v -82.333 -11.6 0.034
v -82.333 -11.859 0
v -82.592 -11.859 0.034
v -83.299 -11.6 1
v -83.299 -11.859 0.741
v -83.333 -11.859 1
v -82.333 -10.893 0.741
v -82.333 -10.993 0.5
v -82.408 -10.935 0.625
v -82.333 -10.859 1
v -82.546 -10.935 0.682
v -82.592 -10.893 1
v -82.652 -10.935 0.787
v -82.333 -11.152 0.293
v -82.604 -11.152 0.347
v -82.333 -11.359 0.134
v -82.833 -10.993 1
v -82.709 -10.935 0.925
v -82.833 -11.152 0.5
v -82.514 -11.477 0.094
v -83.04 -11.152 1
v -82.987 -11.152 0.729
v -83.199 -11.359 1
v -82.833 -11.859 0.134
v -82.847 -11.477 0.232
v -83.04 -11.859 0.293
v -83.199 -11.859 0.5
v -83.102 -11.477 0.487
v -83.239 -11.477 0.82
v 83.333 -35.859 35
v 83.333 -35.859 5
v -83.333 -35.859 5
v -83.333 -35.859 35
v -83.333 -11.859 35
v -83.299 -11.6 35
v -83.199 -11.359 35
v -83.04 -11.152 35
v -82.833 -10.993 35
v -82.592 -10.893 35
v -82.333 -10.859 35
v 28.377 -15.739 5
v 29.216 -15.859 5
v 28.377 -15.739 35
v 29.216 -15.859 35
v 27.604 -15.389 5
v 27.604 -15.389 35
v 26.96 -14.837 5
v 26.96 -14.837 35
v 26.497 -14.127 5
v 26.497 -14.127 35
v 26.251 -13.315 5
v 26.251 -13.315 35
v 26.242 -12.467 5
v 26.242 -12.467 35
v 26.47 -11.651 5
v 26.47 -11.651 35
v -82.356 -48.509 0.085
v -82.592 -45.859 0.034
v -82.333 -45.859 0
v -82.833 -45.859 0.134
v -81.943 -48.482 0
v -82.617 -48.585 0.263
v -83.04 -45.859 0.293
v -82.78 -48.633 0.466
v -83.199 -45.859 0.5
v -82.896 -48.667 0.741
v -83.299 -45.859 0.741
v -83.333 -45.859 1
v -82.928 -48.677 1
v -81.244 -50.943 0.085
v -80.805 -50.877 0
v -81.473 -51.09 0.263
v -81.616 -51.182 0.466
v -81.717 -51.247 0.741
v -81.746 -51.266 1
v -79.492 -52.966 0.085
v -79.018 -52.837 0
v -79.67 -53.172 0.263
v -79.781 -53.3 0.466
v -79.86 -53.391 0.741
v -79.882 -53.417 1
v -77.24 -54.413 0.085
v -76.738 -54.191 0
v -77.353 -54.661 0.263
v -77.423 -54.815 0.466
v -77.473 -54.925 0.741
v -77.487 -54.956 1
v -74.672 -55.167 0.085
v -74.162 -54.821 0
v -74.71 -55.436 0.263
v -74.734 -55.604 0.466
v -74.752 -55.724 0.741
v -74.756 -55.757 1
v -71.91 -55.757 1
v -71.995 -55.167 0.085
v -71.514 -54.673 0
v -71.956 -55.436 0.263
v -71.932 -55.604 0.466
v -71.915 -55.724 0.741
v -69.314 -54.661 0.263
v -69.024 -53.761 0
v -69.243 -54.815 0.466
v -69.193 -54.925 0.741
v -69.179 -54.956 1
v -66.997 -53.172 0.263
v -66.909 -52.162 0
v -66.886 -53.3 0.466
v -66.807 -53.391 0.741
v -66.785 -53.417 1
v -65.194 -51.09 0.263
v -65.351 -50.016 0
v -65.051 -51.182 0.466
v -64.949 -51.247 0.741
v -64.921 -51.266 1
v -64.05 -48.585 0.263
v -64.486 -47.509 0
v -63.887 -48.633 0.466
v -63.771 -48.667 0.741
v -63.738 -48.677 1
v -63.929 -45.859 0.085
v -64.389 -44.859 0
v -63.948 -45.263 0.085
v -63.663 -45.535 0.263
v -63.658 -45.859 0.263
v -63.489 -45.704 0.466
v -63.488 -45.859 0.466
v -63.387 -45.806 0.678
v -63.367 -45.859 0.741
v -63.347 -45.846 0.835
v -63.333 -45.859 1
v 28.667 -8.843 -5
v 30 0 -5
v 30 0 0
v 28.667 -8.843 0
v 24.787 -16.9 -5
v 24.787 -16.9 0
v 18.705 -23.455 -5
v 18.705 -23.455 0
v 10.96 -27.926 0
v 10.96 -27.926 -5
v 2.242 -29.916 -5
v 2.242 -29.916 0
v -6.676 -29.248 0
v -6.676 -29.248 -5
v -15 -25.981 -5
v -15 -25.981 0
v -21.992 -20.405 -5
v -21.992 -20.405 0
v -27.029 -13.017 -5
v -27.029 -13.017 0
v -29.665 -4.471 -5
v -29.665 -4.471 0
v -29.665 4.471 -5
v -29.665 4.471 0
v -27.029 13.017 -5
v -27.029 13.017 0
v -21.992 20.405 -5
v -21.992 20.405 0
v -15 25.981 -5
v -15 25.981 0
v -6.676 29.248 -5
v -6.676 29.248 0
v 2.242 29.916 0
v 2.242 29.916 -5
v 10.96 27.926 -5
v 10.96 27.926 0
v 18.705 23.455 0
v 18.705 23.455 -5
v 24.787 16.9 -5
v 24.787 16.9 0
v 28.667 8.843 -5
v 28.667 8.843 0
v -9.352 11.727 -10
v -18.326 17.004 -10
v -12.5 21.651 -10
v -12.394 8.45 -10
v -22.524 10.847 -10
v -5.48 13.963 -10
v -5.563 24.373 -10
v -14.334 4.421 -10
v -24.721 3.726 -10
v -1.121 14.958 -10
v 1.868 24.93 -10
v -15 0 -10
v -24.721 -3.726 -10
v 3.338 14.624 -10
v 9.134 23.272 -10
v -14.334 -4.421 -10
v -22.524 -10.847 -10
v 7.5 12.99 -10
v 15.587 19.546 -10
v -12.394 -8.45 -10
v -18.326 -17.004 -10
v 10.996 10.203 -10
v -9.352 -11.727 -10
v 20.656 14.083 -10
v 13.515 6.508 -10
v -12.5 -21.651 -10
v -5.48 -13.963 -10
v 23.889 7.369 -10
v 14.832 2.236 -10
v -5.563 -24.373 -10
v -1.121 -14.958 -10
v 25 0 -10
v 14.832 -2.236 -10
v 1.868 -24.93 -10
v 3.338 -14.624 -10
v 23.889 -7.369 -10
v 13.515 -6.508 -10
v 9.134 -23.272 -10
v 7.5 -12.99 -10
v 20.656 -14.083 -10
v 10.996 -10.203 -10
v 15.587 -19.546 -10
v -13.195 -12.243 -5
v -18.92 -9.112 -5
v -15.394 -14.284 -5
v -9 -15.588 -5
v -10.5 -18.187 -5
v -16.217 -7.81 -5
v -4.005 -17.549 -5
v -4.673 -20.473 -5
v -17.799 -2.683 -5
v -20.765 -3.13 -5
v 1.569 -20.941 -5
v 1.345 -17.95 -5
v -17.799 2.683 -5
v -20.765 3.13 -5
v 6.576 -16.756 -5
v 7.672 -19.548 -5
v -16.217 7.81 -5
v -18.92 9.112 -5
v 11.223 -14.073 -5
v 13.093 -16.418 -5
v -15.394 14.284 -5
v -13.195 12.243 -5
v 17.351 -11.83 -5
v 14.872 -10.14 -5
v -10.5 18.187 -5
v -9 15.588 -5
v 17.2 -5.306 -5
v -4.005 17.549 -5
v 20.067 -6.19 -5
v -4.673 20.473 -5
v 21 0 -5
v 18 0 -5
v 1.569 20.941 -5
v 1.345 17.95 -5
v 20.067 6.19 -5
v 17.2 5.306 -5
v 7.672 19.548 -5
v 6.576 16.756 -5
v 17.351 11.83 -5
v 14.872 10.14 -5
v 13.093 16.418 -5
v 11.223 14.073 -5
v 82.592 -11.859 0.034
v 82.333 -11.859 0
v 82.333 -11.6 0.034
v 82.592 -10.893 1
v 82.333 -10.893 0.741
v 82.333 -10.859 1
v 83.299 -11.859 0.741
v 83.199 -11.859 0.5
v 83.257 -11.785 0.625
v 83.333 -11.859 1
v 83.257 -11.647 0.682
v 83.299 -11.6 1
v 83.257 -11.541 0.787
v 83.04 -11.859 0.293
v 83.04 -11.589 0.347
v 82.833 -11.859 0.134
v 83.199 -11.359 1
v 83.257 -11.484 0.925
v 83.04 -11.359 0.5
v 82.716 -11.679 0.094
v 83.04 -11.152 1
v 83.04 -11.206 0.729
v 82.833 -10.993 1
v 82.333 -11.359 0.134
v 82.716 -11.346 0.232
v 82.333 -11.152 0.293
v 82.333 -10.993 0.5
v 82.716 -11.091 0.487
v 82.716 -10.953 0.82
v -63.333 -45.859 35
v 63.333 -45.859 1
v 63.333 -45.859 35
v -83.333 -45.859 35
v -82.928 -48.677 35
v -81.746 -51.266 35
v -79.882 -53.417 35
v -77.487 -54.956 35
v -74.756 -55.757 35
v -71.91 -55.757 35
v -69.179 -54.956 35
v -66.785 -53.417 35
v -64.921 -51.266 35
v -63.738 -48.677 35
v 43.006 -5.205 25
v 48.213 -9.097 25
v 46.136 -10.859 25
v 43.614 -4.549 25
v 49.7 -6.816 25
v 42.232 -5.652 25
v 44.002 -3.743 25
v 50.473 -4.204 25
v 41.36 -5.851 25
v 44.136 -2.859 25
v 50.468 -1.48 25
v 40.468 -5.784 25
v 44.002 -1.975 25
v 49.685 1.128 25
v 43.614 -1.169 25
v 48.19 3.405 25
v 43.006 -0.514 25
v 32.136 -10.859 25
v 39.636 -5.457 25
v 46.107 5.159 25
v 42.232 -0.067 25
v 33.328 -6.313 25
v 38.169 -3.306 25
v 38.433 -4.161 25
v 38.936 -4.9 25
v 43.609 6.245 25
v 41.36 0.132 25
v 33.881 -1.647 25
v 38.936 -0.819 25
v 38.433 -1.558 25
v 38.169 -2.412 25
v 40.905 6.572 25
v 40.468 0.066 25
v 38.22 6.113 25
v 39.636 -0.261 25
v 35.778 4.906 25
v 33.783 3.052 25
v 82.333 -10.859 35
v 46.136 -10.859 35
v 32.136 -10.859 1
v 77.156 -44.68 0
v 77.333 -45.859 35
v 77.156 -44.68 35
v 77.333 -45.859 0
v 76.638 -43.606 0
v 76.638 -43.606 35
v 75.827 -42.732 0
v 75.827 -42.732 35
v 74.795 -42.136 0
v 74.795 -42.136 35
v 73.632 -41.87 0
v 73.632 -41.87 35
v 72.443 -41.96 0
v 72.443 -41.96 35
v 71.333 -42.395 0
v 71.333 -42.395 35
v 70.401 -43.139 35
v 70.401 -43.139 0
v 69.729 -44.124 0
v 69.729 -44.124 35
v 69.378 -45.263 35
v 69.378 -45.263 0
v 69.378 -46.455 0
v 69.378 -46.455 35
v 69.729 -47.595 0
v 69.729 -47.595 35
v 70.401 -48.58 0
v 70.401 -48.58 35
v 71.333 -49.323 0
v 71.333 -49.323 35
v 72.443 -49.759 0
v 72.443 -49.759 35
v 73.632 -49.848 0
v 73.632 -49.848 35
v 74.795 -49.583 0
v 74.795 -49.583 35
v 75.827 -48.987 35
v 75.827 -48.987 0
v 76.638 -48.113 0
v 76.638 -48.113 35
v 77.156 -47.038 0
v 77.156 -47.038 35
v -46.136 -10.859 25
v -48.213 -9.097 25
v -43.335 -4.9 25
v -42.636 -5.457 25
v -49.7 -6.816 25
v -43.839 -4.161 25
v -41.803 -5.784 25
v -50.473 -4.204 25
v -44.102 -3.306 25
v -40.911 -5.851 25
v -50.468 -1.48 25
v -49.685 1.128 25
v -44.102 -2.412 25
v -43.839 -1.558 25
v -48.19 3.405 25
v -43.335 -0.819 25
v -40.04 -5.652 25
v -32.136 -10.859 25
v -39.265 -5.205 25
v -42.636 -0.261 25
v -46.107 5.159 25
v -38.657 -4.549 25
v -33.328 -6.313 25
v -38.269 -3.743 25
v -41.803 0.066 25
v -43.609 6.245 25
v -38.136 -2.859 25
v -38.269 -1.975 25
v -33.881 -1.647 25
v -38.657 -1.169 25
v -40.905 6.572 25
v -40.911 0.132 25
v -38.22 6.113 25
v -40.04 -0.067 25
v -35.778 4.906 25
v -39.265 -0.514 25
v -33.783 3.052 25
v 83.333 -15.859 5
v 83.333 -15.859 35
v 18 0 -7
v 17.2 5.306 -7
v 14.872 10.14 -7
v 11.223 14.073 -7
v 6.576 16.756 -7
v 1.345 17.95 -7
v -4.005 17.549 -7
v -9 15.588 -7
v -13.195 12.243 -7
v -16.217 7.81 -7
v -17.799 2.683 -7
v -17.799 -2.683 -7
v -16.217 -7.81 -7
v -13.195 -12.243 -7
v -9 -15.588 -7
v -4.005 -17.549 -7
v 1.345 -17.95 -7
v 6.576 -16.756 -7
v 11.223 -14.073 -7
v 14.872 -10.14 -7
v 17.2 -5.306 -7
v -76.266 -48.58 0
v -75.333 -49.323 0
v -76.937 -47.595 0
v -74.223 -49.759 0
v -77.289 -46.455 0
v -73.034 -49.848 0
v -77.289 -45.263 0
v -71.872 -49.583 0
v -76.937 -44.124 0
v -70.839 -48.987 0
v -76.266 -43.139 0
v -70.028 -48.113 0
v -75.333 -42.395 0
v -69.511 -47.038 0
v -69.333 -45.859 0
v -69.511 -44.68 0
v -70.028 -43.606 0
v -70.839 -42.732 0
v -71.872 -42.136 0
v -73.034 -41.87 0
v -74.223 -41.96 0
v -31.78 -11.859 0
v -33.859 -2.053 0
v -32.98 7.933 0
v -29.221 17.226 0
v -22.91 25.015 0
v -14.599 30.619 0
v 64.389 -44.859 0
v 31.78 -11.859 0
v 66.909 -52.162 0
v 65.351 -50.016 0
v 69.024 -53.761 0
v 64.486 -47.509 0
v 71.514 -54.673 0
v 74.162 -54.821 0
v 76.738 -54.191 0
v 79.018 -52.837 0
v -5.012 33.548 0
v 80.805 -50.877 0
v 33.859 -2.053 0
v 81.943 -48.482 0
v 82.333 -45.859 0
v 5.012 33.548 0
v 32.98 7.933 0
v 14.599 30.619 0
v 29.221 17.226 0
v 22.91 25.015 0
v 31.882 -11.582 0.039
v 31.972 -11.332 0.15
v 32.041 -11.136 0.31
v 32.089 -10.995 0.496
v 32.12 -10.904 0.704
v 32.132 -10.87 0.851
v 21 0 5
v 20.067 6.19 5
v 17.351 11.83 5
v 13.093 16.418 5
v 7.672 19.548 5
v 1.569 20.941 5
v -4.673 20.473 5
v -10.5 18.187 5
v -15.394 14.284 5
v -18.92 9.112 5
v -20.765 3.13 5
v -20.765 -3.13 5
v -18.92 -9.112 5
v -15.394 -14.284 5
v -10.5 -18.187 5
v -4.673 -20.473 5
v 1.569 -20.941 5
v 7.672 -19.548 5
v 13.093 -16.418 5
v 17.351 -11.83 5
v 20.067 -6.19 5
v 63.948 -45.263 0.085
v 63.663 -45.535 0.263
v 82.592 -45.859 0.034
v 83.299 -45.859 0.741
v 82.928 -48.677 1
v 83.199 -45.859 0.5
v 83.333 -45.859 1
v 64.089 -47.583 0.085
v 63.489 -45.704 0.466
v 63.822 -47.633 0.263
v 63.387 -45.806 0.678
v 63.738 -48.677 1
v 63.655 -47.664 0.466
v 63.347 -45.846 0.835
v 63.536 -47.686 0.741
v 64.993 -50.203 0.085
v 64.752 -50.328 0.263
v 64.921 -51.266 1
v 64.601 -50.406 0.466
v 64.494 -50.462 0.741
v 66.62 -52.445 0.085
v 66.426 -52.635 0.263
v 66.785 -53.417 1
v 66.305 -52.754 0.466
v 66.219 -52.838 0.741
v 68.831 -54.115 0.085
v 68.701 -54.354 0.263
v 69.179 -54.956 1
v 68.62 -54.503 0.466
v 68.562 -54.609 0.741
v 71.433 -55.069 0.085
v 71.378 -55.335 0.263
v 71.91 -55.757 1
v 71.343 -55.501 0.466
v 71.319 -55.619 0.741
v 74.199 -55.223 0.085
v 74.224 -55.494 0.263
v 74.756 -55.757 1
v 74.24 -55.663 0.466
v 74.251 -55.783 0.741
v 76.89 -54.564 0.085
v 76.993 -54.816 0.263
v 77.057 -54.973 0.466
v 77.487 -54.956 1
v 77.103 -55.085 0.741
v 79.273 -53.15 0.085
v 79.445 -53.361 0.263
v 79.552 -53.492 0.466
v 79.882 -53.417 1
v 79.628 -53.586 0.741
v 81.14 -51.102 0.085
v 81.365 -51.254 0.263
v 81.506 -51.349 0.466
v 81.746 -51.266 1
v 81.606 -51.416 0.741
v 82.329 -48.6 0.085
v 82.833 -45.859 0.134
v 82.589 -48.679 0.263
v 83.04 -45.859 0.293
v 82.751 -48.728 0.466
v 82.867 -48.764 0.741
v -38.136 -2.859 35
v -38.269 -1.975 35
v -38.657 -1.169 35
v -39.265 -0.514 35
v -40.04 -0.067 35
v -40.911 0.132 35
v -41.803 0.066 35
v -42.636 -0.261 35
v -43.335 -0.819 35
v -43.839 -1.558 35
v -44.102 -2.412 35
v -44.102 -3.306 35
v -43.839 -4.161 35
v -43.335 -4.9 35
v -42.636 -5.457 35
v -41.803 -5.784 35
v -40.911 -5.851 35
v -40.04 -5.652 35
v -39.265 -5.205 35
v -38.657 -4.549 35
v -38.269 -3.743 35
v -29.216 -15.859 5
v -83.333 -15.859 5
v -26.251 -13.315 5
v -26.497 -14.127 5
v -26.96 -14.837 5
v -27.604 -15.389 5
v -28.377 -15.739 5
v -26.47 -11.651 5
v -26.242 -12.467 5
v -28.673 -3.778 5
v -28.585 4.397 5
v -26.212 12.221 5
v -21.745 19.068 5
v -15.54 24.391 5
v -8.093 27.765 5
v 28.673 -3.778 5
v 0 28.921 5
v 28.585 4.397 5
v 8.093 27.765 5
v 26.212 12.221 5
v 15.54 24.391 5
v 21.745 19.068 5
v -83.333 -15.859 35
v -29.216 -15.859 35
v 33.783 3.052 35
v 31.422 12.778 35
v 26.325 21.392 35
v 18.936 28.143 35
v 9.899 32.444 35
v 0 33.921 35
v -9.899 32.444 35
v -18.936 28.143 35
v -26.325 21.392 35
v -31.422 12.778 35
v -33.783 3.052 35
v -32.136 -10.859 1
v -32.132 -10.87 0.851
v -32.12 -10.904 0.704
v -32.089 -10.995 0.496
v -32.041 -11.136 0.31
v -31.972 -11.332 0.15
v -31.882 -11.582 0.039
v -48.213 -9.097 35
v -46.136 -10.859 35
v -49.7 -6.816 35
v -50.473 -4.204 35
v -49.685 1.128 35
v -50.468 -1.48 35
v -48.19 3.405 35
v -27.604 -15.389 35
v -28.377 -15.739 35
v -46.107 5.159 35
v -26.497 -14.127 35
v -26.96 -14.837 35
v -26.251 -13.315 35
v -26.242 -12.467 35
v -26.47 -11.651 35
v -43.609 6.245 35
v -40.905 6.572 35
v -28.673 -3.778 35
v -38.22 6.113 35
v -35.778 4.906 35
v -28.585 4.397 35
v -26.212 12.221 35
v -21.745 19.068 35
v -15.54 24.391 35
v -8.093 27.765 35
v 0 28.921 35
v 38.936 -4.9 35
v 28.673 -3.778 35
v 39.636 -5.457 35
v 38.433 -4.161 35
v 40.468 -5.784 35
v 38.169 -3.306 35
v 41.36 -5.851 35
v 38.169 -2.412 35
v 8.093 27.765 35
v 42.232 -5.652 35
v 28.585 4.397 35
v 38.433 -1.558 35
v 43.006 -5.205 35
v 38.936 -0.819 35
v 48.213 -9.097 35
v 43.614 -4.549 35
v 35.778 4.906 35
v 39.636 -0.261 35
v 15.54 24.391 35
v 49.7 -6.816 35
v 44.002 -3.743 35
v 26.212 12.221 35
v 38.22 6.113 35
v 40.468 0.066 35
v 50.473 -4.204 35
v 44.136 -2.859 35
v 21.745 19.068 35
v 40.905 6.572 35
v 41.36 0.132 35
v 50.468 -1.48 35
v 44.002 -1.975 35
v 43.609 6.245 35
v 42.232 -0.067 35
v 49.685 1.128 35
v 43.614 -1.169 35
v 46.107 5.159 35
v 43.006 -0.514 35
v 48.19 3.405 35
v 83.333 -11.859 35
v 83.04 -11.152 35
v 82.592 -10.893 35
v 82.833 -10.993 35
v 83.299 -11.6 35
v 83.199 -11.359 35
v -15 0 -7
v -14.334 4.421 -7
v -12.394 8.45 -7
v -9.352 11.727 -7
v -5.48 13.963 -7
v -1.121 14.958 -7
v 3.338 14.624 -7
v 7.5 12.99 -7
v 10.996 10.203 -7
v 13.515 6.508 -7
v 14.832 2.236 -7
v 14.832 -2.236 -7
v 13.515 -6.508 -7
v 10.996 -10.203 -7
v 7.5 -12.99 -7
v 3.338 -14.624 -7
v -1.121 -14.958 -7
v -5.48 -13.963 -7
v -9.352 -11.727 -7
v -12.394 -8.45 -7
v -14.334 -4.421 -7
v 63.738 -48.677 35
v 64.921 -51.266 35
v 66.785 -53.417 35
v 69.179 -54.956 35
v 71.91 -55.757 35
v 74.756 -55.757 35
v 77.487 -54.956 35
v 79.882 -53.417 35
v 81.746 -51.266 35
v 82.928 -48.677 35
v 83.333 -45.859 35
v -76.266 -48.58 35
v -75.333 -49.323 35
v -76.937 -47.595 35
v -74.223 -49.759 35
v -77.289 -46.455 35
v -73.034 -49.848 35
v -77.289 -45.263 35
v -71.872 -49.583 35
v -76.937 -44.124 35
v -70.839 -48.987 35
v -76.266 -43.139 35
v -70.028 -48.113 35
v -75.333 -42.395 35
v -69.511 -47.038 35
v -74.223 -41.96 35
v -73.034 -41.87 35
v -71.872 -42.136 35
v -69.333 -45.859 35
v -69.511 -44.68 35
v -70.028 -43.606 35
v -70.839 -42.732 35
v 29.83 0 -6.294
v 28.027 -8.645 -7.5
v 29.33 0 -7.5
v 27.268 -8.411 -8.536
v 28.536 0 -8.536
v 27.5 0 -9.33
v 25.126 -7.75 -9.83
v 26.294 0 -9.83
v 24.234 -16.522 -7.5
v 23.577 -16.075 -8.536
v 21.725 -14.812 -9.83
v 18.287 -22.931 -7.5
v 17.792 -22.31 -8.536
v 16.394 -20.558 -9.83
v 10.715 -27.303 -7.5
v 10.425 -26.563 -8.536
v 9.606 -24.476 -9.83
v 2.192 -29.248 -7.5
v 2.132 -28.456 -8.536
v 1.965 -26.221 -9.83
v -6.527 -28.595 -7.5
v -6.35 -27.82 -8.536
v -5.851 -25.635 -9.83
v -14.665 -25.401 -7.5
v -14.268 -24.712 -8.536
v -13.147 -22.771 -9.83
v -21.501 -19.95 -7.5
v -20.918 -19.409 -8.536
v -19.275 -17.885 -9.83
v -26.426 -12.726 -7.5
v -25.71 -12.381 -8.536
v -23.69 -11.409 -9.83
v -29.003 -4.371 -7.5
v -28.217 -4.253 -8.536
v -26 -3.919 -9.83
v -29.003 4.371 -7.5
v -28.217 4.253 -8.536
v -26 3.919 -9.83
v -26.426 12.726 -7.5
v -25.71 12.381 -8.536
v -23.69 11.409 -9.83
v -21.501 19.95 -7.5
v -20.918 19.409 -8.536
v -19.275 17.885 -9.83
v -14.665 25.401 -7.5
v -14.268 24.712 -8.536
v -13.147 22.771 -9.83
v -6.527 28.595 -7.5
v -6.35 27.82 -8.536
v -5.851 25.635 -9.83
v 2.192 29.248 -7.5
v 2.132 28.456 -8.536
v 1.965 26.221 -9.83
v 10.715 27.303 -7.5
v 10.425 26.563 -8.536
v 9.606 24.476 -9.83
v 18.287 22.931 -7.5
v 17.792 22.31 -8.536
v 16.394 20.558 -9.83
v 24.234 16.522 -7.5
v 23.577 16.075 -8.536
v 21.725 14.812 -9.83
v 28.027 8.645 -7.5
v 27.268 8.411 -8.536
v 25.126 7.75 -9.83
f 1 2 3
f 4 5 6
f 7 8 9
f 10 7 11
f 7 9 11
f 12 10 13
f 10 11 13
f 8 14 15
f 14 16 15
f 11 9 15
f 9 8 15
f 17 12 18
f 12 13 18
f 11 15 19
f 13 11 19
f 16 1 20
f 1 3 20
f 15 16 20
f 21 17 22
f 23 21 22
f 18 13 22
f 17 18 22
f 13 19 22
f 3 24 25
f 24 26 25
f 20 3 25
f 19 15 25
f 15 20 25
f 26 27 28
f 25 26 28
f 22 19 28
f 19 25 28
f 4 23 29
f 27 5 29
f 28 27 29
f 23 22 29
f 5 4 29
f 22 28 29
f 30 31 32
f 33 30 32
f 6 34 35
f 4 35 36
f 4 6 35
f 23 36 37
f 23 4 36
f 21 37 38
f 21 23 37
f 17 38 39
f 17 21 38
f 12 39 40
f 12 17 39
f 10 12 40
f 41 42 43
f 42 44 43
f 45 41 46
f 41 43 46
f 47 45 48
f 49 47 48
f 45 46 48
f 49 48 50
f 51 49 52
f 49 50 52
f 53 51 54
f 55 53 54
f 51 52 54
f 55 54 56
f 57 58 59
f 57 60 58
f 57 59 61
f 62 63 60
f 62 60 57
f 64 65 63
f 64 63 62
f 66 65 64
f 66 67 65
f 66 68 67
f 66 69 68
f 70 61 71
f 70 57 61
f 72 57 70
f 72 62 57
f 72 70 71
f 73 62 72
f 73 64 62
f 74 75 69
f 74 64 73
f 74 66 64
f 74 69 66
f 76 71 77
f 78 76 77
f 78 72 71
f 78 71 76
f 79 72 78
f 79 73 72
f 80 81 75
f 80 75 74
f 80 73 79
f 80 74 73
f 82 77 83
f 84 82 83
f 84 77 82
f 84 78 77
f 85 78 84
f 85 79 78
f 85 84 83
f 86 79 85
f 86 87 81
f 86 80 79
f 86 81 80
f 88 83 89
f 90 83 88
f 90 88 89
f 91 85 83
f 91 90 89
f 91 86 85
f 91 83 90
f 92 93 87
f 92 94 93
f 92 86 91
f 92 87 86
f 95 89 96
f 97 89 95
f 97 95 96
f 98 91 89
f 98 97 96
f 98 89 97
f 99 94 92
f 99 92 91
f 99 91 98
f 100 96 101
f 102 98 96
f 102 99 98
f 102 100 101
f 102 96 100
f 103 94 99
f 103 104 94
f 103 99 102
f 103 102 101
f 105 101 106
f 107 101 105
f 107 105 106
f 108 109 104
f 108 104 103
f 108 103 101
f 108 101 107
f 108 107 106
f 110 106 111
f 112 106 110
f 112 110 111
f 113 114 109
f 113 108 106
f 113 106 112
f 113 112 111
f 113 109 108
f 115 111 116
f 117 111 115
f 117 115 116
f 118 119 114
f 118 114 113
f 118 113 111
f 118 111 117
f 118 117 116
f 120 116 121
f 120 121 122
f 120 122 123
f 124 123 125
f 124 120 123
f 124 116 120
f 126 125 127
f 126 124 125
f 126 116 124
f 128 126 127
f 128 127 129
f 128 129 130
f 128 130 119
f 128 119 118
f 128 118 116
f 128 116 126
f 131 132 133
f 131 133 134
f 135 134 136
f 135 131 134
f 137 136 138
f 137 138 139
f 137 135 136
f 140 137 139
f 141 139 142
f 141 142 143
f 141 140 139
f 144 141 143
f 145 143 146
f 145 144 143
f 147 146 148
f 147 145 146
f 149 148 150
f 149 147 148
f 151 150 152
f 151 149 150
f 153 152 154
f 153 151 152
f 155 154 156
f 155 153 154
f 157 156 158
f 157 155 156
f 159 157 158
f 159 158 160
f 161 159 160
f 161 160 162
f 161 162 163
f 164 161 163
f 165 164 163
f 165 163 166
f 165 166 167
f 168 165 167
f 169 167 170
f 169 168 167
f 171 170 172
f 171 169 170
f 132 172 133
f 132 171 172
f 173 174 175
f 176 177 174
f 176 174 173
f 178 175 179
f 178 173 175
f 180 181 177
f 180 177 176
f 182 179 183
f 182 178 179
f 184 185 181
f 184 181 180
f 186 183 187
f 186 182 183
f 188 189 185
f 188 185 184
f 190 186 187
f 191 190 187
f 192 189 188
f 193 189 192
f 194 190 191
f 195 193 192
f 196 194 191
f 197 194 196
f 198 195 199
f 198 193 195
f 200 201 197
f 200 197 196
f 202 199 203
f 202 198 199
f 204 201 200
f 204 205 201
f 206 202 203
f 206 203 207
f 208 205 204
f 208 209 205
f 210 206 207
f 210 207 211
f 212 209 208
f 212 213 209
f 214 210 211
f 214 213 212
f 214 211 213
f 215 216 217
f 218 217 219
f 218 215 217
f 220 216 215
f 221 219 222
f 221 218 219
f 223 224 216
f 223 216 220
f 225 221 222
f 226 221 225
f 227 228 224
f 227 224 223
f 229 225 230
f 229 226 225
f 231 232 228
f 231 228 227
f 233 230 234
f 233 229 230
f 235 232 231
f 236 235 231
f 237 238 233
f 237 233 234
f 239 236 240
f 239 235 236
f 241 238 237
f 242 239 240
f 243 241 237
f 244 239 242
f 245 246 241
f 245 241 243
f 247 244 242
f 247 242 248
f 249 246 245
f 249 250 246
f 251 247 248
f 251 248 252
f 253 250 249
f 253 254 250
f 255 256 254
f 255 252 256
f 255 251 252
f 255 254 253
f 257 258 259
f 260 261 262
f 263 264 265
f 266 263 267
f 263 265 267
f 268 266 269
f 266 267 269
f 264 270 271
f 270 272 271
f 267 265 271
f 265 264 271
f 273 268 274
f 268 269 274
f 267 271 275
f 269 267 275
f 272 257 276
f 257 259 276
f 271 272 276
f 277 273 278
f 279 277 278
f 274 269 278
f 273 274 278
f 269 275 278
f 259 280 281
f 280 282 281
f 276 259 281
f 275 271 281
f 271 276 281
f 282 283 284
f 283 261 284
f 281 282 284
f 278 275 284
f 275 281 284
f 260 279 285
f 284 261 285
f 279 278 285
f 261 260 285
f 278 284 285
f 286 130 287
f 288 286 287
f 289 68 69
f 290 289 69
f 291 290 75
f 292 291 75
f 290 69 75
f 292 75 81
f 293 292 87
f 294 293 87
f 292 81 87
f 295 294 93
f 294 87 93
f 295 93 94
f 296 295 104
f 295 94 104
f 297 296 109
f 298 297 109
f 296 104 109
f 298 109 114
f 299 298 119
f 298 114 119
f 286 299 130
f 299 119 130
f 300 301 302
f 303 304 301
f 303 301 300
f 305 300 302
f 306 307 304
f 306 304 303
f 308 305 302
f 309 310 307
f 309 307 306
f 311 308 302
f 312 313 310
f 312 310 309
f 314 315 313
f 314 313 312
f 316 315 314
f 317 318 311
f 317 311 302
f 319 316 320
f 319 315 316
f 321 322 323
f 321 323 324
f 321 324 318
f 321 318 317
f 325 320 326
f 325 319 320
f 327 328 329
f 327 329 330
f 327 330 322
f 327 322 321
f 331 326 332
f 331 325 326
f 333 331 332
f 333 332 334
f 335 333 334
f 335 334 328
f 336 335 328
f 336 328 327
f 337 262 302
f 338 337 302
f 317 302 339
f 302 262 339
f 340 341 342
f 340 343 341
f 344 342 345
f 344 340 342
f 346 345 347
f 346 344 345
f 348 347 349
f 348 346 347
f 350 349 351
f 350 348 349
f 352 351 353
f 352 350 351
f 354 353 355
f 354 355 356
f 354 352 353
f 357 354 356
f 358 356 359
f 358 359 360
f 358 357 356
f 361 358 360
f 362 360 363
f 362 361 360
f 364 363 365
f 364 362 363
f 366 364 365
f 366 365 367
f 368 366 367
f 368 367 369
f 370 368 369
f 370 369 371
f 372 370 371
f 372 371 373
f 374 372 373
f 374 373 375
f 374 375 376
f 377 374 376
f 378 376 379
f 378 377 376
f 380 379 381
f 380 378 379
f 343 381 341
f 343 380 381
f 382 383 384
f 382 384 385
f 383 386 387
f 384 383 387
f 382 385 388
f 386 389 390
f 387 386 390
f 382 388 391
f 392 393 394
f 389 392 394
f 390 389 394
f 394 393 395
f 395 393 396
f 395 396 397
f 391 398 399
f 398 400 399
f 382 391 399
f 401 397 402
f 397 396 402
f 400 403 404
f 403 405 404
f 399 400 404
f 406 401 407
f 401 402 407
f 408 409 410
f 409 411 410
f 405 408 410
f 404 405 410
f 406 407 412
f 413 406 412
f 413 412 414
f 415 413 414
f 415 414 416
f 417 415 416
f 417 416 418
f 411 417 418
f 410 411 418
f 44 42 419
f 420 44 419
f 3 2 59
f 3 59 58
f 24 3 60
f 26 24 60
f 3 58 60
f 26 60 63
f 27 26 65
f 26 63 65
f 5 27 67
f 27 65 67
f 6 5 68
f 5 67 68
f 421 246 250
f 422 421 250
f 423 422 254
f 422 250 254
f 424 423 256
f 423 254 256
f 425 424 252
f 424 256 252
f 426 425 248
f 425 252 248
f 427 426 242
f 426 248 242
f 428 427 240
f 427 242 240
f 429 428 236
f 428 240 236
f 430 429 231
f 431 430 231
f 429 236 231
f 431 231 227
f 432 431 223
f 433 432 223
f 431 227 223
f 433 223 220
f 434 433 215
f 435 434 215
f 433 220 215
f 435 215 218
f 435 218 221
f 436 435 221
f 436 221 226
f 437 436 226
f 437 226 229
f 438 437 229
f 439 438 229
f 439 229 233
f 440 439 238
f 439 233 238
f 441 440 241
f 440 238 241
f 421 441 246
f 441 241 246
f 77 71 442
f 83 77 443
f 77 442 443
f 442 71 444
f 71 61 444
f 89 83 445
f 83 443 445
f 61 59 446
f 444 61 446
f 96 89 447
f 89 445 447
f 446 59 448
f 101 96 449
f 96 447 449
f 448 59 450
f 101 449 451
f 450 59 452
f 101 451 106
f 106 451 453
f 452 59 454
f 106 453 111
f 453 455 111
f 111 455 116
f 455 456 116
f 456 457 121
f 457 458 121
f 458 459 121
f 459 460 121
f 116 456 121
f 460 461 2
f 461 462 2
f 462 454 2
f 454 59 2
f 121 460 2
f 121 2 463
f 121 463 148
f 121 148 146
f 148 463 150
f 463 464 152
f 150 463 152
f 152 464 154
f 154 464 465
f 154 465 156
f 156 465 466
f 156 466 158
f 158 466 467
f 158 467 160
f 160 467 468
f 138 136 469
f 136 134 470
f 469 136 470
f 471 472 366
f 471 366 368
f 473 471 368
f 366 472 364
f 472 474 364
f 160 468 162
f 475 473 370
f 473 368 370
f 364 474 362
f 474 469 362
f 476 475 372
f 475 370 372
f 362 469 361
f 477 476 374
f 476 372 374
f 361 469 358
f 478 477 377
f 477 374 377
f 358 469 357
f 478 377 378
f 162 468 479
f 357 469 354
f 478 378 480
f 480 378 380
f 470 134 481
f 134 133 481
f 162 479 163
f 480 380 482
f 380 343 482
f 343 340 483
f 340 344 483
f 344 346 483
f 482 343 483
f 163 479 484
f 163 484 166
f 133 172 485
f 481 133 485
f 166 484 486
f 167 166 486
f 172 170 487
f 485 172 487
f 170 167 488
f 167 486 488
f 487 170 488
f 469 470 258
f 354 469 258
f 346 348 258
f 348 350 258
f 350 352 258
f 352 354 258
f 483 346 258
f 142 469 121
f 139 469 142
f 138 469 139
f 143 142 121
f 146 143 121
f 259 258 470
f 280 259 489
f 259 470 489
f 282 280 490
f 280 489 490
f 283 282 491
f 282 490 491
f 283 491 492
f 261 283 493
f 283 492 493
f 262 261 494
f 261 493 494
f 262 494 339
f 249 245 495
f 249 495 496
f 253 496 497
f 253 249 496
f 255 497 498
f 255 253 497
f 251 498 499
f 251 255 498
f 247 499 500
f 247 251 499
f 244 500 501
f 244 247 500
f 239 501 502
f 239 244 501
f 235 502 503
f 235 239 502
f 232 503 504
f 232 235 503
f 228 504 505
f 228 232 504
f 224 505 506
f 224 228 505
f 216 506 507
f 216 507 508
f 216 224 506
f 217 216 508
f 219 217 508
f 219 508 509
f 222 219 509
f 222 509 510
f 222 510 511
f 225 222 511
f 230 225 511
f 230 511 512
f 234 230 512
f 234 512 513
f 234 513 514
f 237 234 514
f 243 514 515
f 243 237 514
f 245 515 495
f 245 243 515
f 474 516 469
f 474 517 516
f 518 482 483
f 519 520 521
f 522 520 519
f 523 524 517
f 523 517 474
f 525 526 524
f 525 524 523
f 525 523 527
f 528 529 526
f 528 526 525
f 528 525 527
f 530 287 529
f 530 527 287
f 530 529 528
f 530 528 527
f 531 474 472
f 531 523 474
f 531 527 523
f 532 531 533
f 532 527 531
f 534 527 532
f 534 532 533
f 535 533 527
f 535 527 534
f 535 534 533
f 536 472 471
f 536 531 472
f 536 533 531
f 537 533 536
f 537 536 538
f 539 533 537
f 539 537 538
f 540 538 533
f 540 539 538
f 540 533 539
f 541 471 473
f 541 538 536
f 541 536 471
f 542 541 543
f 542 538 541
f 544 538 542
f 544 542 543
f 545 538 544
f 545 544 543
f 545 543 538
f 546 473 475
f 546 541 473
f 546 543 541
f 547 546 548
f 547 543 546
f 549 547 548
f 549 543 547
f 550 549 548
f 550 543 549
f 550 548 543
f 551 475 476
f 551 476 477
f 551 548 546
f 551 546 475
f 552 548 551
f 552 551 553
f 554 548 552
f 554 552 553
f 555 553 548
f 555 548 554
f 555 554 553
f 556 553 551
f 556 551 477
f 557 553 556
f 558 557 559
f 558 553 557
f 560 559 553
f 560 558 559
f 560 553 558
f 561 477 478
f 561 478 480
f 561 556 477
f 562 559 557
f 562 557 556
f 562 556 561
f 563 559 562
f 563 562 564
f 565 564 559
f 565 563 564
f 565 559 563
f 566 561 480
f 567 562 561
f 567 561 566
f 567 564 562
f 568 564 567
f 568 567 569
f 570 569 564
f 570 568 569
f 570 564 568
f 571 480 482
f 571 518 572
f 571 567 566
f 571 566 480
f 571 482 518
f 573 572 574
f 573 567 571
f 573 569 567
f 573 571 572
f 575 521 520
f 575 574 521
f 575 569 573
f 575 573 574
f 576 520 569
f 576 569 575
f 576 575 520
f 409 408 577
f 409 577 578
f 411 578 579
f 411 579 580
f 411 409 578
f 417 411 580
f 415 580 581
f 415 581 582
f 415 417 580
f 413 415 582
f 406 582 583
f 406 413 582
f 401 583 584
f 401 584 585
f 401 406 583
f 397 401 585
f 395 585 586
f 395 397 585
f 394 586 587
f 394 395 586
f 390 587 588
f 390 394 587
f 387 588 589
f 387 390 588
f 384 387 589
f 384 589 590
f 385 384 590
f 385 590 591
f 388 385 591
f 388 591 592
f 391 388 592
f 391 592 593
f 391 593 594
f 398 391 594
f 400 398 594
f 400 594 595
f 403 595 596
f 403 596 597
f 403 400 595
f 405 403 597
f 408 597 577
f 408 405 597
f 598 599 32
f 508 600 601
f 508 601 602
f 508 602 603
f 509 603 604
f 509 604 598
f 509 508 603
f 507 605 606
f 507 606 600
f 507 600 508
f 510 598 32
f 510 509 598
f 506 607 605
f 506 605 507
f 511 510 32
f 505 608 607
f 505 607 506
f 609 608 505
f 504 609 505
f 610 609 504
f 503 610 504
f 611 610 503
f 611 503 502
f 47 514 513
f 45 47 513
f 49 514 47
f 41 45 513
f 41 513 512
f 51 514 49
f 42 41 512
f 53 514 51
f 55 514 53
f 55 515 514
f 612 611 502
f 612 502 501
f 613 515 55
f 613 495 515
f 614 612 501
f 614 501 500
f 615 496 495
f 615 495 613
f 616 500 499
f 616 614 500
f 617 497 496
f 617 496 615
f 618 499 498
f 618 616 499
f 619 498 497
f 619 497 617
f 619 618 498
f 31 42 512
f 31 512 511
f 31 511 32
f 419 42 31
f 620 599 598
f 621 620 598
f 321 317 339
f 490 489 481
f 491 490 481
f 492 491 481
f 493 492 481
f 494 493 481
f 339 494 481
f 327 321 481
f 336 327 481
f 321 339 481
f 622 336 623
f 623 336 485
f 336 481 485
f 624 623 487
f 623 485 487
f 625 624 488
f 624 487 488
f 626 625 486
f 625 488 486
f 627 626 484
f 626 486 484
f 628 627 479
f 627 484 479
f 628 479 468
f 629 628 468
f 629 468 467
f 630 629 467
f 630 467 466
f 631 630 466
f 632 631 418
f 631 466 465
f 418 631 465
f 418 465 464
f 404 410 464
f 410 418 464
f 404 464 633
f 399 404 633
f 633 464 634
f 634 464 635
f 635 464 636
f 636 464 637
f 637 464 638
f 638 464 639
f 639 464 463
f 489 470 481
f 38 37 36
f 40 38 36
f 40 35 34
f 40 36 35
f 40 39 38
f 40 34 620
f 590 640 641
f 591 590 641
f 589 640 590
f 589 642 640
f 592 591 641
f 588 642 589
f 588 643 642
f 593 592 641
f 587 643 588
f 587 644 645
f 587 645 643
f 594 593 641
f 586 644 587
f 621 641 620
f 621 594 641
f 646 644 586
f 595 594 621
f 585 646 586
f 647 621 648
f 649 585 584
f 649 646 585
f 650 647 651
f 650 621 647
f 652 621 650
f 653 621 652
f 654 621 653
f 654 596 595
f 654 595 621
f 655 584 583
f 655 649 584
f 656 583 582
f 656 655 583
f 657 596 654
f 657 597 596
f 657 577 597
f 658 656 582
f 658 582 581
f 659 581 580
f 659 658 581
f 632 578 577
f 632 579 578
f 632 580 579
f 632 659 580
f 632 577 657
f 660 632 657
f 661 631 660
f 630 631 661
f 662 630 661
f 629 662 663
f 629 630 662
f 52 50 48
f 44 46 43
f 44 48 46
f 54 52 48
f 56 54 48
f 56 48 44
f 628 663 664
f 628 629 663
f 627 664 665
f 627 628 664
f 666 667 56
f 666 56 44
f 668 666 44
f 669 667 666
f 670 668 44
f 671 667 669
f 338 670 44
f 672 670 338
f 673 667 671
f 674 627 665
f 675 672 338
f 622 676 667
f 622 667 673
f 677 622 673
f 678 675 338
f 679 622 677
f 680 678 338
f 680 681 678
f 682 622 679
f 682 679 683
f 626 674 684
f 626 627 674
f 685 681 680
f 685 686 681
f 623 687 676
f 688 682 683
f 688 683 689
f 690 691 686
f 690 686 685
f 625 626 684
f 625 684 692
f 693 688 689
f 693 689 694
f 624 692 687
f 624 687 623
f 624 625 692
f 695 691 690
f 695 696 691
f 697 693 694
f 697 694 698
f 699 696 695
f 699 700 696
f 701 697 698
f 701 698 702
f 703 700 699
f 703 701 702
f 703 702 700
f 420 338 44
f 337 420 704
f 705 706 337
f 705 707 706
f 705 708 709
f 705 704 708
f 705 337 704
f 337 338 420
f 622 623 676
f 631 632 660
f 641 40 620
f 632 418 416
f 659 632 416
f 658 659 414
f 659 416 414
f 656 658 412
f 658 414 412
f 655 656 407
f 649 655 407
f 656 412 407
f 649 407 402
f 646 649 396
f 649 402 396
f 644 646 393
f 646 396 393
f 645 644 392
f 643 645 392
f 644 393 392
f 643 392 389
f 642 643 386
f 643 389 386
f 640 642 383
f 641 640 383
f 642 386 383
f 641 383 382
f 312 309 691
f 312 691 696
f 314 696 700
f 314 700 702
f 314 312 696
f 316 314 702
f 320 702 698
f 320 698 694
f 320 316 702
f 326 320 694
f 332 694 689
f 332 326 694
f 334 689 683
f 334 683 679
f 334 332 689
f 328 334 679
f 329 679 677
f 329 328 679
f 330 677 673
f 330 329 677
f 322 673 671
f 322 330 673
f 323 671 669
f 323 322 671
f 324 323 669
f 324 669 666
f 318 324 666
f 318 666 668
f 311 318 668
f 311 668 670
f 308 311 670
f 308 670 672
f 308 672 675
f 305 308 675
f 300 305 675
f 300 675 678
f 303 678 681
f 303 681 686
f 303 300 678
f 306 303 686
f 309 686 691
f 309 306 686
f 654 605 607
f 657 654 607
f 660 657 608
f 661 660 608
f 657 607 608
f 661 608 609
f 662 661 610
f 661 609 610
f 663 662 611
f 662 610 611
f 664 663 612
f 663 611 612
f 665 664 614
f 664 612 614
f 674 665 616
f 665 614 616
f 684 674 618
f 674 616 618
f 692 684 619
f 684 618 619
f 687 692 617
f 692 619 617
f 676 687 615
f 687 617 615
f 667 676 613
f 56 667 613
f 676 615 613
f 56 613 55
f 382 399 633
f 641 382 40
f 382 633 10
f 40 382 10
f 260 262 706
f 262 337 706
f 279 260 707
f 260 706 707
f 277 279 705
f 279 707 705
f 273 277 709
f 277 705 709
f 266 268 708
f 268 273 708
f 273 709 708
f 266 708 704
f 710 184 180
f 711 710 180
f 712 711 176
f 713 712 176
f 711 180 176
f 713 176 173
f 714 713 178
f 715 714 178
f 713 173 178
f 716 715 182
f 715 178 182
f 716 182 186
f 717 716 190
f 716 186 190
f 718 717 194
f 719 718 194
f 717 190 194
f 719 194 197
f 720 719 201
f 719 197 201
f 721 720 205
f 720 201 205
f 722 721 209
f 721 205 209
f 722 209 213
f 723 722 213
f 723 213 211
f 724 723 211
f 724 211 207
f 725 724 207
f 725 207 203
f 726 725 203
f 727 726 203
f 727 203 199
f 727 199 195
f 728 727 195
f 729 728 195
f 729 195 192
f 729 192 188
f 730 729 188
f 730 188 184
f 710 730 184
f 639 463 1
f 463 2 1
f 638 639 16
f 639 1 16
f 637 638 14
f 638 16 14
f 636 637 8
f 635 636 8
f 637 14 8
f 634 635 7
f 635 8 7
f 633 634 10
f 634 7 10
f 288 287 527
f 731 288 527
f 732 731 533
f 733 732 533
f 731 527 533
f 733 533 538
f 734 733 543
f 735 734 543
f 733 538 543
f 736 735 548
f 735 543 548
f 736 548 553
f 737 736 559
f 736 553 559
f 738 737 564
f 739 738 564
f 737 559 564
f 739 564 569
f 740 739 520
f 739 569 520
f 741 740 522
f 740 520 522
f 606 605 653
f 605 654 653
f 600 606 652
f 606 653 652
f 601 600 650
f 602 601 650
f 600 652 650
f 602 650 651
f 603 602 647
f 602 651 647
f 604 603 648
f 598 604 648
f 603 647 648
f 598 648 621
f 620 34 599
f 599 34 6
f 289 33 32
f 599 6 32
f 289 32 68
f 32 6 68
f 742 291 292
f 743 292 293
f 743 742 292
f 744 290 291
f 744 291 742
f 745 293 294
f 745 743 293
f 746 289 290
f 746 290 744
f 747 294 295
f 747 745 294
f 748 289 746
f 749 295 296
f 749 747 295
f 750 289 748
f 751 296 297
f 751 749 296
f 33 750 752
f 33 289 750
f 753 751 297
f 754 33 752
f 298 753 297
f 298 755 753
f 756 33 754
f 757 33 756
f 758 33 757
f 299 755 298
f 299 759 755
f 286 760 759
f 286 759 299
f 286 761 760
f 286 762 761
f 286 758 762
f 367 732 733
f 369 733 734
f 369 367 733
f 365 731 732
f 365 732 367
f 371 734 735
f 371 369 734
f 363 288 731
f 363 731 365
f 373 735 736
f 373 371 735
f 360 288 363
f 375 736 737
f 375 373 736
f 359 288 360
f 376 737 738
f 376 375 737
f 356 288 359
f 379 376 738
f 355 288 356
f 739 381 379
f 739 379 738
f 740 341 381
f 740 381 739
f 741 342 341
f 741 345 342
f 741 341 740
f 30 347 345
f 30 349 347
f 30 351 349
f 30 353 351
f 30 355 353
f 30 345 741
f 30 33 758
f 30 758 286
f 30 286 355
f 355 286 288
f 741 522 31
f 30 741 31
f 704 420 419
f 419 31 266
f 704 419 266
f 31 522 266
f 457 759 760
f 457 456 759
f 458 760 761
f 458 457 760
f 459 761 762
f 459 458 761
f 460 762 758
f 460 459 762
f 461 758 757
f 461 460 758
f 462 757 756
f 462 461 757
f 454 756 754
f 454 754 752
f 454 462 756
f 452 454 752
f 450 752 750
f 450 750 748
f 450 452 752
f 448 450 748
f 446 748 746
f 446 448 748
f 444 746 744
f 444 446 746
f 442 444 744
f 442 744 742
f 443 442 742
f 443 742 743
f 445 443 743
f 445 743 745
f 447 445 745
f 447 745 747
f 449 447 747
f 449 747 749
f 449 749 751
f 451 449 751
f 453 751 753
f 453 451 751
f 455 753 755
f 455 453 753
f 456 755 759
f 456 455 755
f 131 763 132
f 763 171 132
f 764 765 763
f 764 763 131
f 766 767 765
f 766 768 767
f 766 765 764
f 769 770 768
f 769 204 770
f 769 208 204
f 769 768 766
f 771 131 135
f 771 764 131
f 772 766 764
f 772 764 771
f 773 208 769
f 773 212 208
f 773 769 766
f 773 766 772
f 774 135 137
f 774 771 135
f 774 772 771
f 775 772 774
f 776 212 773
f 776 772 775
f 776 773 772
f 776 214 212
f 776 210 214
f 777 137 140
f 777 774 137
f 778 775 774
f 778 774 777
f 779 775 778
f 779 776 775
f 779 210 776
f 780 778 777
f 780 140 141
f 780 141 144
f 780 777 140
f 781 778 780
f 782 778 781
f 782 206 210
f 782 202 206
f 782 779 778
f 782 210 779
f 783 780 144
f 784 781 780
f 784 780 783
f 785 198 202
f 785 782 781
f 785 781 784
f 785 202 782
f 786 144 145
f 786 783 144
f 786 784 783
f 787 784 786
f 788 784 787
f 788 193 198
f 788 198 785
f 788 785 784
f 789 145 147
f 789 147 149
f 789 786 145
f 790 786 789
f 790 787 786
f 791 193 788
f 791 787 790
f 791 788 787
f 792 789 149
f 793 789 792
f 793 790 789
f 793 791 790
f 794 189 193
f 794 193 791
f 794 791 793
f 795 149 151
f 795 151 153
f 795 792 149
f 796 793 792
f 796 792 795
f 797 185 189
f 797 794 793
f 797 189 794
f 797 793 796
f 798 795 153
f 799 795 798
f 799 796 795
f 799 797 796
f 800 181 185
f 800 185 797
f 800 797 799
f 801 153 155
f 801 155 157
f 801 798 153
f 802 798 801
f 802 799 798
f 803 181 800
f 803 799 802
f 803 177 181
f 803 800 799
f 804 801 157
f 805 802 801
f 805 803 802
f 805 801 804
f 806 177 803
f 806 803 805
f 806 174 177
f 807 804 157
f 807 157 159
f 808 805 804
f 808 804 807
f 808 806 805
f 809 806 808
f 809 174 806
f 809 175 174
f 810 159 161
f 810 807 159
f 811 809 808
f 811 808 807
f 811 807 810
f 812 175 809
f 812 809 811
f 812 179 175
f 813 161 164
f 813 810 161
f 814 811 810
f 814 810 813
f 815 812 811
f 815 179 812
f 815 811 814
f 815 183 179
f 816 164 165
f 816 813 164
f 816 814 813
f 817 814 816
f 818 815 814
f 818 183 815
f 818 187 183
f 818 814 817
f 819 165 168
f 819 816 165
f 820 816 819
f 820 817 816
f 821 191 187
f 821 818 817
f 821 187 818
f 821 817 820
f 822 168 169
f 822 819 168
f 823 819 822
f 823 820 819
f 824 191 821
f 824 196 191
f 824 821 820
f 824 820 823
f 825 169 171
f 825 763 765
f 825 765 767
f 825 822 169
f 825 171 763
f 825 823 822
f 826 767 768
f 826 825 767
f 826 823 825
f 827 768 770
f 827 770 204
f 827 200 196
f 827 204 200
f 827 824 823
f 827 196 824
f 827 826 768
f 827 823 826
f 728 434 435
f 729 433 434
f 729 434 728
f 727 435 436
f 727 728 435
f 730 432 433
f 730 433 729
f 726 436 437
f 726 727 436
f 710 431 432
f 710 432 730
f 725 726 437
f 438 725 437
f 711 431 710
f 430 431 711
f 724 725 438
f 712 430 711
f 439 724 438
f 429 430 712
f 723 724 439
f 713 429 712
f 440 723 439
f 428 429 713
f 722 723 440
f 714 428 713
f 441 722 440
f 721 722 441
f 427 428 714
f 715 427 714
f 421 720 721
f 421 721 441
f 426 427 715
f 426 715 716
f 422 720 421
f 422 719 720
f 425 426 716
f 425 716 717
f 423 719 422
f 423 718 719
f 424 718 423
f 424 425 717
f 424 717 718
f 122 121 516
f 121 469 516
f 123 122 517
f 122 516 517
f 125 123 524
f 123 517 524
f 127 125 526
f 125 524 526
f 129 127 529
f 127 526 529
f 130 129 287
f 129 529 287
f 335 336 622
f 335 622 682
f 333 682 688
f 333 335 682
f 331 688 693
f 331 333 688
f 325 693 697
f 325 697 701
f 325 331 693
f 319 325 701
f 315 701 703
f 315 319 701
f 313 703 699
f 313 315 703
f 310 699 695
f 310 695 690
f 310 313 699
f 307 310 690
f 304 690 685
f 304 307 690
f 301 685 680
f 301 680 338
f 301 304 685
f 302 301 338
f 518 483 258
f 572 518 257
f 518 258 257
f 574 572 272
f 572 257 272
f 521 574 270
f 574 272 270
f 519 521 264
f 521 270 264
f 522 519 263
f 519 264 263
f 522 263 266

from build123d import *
from build123d.topology import SkipClean

# Parameters (mm, degrees)
SKETCH1_R           = 4
SKETCH1_R_2         = 15
BOSS_EXTRUDE2_DEPTH = 5
SKETCH2_R           = 4
BOSS_EXTRUDE3_DEPTH = 30
BOSS_EXTRUDE4_START = 10
SKETCH4_R           = 30
SKETCH4_R_2         = 15
BOSS_EXTRUDE4_DEPTH = 10
BOSS_EXTRUDE6_START = -10
SKETCH7_R           = 3
BOSS_EXTRUDE6_DEPTH = 10
FILLET1_R           = 5
CUT_EXTRUDE2_START  = -10
SKETCH5_R           = 21
SKETCH5_R_2         = 15
CUT_EXTRUDE2_DEPTH  = 10
SKETCH8_R           = 18
CUT_EXTRUDE3_DEPTH  = 2
FILLET2_R           = 1
FILLET3_R           = 3


with BuildPart() as part:
    # Sketch1 → Boss-Extrude2 (new body)
    with BuildSketch(Plane.XY):
        with BuildLine():
            Line((-83.333333333, -10.859226218), (-83.333333333, -35.859226218))
            Line((-83.333333333, -35.859226218), (-83.333333333, -45.859226218))
            ThreePointArc((-83.333333333, -45.859226218), (-73.333333333, -55.859226218), (-63.333333333, -45.859226218))
            Line((-63.333333333, -45.859226218), (0, -45.859226218))
            Line((0, -45.859226218), (63.333333333, -45.859226218))
            ThreePointArc((63.333333333, -45.859226218), (73.333333333, -55.859226218), (83.333333333, -45.859226218))
            Line((83.333333333, -45.859226218), (83.333333333, -35.859226218))
            Line((83.333333333, -35.859226218), (83.333333333, -10.859226218))
            Line((83.333333333, -10.859226218), (32.135632545, -10.859226218))
            ThreePointArc((32.135632545, -10.859226218), (0, 33.920814748), (-32.135632545, -10.859226218))
            Line((-32.135632545, -10.859226218), (-83.333333333, -10.859226218))
        make_face()
        with Locations((-73.333333333, -45.859226218)):
            Circle(SKETCH1_R, mode=Mode.SUBTRACT)
        with Locations((73.333333333, -45.859226218)):
            Circle(SKETCH1_R, mode=Mode.SUBTRACT)
        Circle(SKETCH1_R_2, mode=Mode.SUBTRACT)
    extrude(amount=BOSS_EXTRUDE2_DEPTH)

    # Sketch2 → Boss-Extrude3 (add)
    # profile 1 of 2: a face of its own
    with BuildSketch(Plane.XY.offset(5)):
        with BuildLine():
            Line((83.333333333, -35.859226218), (-83.333333333, -35.859226218))
            Line((-83.333333333, -35.859226218), (-83.333333333, -45.859226218))
            ThreePointArc((-83.333333333, -45.859226218), (-73.333333333, -55.859226218), (-63.333333333, -45.859226218))
            Line((-63.333333333, -45.859226218), (63.333333333, -45.859226218))
            ThreePointArc((63.333333333, -45.859226218), (73.333333333, -55.859226218), (83.333333333, -45.859226218))
            Line((83.333333333, -45.859226218), (83.333333333, -35.859226218))
        make_face()
        with Locations((-73.333333333, -45.859226218)):
            Circle(SKETCH2_R, mode=Mode.SUBTRACT)
        with Locations((73.333333333, -45.859226218)):
            Circle(SKETCH2_R, mode=Mode.SUBTRACT)
    # profile 2 of 2: a face of its own
    with BuildSketch(Plane.XY.offset(5)):
        with BuildLine():
            Line((-83.333333333, -10.859226218), (-83.333333333, -15.859226218))
            Line((-83.333333333, -15.859226218), (-24.184674268, -15.859226218))
            ThreePointArc((-24.184674268, -15.859226218), (0, 28.920814748), (24.184674268, -15.859226218))
            Line((24.184674268, -15.859226218), (83.333333333, -15.859226218))
            Line((83.333333333, -15.859226218), (83.333333333, -10.859226218))
            Line((83.333333333, -10.859226218), (32.135632545, -10.859226218))
            ThreePointArc((32.135632545, -10.859226218), (0, 33.920814748), (-32.135632545, -10.859226218))
            Line((-32.135632545, -10.859226218), (-83.333333333, -10.859226218))
        make_face()
    extrude(amount=BOSS_EXTRUDE3_DEPTH)

    # Sketch4 → Boss-Extrude4 (add)
    with SkipClean():  # the faces are left unmerged after this step: merging them gives an invalid solid
        with BuildSketch(Plane(origin=(0, 0, 0), x_dir=(-1, 0, 0), z_dir=(0, 0, -1)).offset(BOSS_EXTRUDE4_START)):
            with Locations(Location((0, 0, 0), (0, 0, 180))):
                Circle(SKETCH4_R)
            Circle(SKETCH4_R_2, mode=Mode.SUBTRACT)
        extrude(amount=-BOSS_EXTRUDE4_DEPTH)

    # Sketch7 → Boss-Extrude6 (add)
    # profile 1 of 2: a face of its own
    with SkipClean():  # the faces are left unmerged after this step: merging them gives an invalid solid
        with BuildSketch(Plane.XY.offset(35).offset(BOSS_EXTRUDE6_START)):
            with BuildLine():
                Line((-46.135632545, -10.859226218), (-32.135632545, -10.859226218))
                ThreePointArc((-32.135632545, -10.859226218), (-33.685378506, -3.989604998), (-33.783237398, 3.051973795))
                ThreePointArc((-33.783237398, 3.051973795), (-48.189979587, 3.404653395), (-46.135632545, -10.859226218))
            make_face()
            with Locations((-41.135632545, -2.859226218)):
                Circle(SKETCH7_R, mode=Mode.SUBTRACT)
        # profile 2 of 2: a face of its own
        with BuildSketch(Plane.XY.offset(35).offset(BOSS_EXTRUDE6_START)):
            with BuildLine():
                Line((46.135632545, -10.859226218), (32.135632545, -10.859226218))
                ThreePointArc((32.135632545, -10.859226218), (33.685378506, -3.989604998), (33.783237398, 3.051973795))
                ThreePointArc((33.783237398, 3.051973795), (48.189979587, 3.404653395), (46.135632545, -10.859226218))
            make_face()
            with Locations((41.135632545, -2.859226218)):
                Circle(SKETCH7_R, mode=Mode.SUBTRACT)
        extrude(amount=BOSS_EXTRUDE6_DEPTH)

    # Fillet1
    fillet1_edges = [part.edges().sort_by_distance(p)[0] for p in [
        (-30, 0, -10),
    ]]
    fillet(fillet1_edges, radius=FILLET1_R)

    # Sketch5 → Cut-Extrude2 (cut)
    with BuildSketch(Plane.XY.offset(5).offset(CUT_EXTRUDE2_START)):
        Circle(SKETCH5_R)
        with Locations(Location((0, 0, 0), (0, 0, 180))):
            Circle(SKETCH5_R_2, mode=Mode.SUBTRACT)
    extrude(amount=CUT_EXTRUDE2_DEPTH, mode=Mode.SUBTRACT)

    # Sketch8 → Cut-Extrude3 (cut)
    with BuildSketch(Plane.XY.offset(-5)):
        Circle(SKETCH8_R)
    extrude(amount=-CUT_EXTRUDE3_DEPTH, mode=Mode.SUBTRACT)

    # Fillet2
    fillet2_edges = [part.edges().sort_by_distance(p)[0] for p in [
        (-73.333333333, -55.859226218, 0),
        (-83.333333333, -28.359226218, 0),
        (-57.734482939, -10.859226218, 0),
        (57.734482939, -10.859226218, 0),
        (83.333333333, -28.359226218, 0),
        (73.333333333, -55.859226218, 0),
        (0, -45.859226218, 0),
        (-83.333333333, -10.859226218, 17.5),
        (83.333333333, -10.859226218, 17.5),
    ]]
    fillet(fillet2_edges, radius=FILLET2_R)

    # Fillet3
    fillet3_edges = [part.edges().sort_by_distance(p)[0] for p in [
        (-24.184674268, -15.859226218, 20),
        (24.184674268, -15.859226218, 20),
    ]]
    fillet(fillet3_edges, radius=FILLET3_R)


solid = part.part
